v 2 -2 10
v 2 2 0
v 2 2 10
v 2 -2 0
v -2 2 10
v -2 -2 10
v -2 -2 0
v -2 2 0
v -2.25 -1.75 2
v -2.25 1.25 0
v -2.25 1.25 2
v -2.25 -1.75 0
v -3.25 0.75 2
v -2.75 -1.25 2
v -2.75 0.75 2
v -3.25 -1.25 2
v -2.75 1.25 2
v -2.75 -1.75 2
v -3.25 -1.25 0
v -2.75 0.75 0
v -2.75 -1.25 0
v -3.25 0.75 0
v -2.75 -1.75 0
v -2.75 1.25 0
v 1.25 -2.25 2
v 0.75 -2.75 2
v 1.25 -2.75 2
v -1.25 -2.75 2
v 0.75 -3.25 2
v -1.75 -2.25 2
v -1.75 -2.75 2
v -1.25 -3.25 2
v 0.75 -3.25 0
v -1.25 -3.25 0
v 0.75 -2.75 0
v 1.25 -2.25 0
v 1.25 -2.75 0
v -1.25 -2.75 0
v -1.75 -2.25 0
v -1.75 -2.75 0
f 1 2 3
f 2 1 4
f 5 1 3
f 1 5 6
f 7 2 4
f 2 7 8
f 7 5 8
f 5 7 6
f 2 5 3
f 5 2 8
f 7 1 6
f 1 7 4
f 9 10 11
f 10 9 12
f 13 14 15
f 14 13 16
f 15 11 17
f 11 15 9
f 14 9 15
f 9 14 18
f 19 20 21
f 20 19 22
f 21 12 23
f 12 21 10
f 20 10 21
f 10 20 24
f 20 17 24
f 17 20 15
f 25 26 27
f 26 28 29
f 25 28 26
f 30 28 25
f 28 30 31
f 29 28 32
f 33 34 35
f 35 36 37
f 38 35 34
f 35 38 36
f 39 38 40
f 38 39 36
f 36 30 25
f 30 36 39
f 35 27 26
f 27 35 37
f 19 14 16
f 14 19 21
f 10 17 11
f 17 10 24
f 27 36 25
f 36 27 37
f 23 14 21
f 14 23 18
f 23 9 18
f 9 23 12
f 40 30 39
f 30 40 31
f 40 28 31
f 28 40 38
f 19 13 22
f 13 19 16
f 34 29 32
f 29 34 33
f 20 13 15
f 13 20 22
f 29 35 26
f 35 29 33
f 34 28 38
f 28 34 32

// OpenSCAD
translate([0, 0, 5]) color([0,1,0,0.9]) cube([4, 4, 10], center=true);
translate([-2.5, 0.0, 1]) color([1,0,0]) cube([0.5, 0.5, 2], center=true);
translate([0.0, -2.5, 1]) color([1,0,0]) cube([0.5, 0.5, 2], center=true);
translate([-2.5, -0.5, 1]) color([1,0,0]) cube([0.5, 0.5, 2], center=true);
translate([-2.5, 0.5, 1]) color([1,0,0]) cube([0.5, 0.5, 2], center=true);
translate([-0.5, -2.5, 1]) color([1,0,0]) cube([0.5, 0.5, 2], center=true);
translate([0.5, -2.5, 1]) color([1,0,0]) cube([0.5, 0.5, 2], center=true);
translate([-2.5, -1.0, 1]) color([1,0,0]) cube([0.5, 0.5, 2], center=true);
translate([-2.5, 1.0, 1]) color([1,0,0]) cube([0.5, 0.5, 2], center=true);
translate([-1.0, -2.5, 1]) color([1,0,0]) cube([0.5, 0.5, 2], center=true);
translate([1.0, -2.5, 1]) color([1,0,0]) cube([0.5, 0.5, 2], center=true);
translate([-2.5, -1.5, 1]) color([1,0,0]) cube([0.5, 0.5, 2], center=true);
translate([-1.5, -2.5, 1]) color([1,0,0]) cube([0.5, 0.5, 2], center=true);
translate([-3.0, 0.0, 1]) color([1,0,0]) cube([0.5, 0.5, 2], center=true);
translate([0.0, -3.0, 1]) color([1,0,0]) cube([0.5, 0.5, 2], center=true);
translate([-3.0, -0.5, 1]) color([1,0,0]) cube([0.5, 0.5, 2], center=true);
translate([-3.0, 0.5, 1]) color([1,0,0]) cube([0.5, 0.5, 2], center=true);
translate([-0.5, -3.0, 1]) color([1,0,0]) cube([0.5, 0.5, 2], center=true);
translate([0.5, -3.0, 1]) color([1,0,0]) cube([0.5, 0.5, 2], center=true);
translate([-3.0, -1.0, 1]) color([1,0,0]) cube([0.5, 0.5, 2], center=true);
translate([-1.0, -3.0, 1]) color([1,0,0]) cube([0.5, 0.5, 2], center=true);
